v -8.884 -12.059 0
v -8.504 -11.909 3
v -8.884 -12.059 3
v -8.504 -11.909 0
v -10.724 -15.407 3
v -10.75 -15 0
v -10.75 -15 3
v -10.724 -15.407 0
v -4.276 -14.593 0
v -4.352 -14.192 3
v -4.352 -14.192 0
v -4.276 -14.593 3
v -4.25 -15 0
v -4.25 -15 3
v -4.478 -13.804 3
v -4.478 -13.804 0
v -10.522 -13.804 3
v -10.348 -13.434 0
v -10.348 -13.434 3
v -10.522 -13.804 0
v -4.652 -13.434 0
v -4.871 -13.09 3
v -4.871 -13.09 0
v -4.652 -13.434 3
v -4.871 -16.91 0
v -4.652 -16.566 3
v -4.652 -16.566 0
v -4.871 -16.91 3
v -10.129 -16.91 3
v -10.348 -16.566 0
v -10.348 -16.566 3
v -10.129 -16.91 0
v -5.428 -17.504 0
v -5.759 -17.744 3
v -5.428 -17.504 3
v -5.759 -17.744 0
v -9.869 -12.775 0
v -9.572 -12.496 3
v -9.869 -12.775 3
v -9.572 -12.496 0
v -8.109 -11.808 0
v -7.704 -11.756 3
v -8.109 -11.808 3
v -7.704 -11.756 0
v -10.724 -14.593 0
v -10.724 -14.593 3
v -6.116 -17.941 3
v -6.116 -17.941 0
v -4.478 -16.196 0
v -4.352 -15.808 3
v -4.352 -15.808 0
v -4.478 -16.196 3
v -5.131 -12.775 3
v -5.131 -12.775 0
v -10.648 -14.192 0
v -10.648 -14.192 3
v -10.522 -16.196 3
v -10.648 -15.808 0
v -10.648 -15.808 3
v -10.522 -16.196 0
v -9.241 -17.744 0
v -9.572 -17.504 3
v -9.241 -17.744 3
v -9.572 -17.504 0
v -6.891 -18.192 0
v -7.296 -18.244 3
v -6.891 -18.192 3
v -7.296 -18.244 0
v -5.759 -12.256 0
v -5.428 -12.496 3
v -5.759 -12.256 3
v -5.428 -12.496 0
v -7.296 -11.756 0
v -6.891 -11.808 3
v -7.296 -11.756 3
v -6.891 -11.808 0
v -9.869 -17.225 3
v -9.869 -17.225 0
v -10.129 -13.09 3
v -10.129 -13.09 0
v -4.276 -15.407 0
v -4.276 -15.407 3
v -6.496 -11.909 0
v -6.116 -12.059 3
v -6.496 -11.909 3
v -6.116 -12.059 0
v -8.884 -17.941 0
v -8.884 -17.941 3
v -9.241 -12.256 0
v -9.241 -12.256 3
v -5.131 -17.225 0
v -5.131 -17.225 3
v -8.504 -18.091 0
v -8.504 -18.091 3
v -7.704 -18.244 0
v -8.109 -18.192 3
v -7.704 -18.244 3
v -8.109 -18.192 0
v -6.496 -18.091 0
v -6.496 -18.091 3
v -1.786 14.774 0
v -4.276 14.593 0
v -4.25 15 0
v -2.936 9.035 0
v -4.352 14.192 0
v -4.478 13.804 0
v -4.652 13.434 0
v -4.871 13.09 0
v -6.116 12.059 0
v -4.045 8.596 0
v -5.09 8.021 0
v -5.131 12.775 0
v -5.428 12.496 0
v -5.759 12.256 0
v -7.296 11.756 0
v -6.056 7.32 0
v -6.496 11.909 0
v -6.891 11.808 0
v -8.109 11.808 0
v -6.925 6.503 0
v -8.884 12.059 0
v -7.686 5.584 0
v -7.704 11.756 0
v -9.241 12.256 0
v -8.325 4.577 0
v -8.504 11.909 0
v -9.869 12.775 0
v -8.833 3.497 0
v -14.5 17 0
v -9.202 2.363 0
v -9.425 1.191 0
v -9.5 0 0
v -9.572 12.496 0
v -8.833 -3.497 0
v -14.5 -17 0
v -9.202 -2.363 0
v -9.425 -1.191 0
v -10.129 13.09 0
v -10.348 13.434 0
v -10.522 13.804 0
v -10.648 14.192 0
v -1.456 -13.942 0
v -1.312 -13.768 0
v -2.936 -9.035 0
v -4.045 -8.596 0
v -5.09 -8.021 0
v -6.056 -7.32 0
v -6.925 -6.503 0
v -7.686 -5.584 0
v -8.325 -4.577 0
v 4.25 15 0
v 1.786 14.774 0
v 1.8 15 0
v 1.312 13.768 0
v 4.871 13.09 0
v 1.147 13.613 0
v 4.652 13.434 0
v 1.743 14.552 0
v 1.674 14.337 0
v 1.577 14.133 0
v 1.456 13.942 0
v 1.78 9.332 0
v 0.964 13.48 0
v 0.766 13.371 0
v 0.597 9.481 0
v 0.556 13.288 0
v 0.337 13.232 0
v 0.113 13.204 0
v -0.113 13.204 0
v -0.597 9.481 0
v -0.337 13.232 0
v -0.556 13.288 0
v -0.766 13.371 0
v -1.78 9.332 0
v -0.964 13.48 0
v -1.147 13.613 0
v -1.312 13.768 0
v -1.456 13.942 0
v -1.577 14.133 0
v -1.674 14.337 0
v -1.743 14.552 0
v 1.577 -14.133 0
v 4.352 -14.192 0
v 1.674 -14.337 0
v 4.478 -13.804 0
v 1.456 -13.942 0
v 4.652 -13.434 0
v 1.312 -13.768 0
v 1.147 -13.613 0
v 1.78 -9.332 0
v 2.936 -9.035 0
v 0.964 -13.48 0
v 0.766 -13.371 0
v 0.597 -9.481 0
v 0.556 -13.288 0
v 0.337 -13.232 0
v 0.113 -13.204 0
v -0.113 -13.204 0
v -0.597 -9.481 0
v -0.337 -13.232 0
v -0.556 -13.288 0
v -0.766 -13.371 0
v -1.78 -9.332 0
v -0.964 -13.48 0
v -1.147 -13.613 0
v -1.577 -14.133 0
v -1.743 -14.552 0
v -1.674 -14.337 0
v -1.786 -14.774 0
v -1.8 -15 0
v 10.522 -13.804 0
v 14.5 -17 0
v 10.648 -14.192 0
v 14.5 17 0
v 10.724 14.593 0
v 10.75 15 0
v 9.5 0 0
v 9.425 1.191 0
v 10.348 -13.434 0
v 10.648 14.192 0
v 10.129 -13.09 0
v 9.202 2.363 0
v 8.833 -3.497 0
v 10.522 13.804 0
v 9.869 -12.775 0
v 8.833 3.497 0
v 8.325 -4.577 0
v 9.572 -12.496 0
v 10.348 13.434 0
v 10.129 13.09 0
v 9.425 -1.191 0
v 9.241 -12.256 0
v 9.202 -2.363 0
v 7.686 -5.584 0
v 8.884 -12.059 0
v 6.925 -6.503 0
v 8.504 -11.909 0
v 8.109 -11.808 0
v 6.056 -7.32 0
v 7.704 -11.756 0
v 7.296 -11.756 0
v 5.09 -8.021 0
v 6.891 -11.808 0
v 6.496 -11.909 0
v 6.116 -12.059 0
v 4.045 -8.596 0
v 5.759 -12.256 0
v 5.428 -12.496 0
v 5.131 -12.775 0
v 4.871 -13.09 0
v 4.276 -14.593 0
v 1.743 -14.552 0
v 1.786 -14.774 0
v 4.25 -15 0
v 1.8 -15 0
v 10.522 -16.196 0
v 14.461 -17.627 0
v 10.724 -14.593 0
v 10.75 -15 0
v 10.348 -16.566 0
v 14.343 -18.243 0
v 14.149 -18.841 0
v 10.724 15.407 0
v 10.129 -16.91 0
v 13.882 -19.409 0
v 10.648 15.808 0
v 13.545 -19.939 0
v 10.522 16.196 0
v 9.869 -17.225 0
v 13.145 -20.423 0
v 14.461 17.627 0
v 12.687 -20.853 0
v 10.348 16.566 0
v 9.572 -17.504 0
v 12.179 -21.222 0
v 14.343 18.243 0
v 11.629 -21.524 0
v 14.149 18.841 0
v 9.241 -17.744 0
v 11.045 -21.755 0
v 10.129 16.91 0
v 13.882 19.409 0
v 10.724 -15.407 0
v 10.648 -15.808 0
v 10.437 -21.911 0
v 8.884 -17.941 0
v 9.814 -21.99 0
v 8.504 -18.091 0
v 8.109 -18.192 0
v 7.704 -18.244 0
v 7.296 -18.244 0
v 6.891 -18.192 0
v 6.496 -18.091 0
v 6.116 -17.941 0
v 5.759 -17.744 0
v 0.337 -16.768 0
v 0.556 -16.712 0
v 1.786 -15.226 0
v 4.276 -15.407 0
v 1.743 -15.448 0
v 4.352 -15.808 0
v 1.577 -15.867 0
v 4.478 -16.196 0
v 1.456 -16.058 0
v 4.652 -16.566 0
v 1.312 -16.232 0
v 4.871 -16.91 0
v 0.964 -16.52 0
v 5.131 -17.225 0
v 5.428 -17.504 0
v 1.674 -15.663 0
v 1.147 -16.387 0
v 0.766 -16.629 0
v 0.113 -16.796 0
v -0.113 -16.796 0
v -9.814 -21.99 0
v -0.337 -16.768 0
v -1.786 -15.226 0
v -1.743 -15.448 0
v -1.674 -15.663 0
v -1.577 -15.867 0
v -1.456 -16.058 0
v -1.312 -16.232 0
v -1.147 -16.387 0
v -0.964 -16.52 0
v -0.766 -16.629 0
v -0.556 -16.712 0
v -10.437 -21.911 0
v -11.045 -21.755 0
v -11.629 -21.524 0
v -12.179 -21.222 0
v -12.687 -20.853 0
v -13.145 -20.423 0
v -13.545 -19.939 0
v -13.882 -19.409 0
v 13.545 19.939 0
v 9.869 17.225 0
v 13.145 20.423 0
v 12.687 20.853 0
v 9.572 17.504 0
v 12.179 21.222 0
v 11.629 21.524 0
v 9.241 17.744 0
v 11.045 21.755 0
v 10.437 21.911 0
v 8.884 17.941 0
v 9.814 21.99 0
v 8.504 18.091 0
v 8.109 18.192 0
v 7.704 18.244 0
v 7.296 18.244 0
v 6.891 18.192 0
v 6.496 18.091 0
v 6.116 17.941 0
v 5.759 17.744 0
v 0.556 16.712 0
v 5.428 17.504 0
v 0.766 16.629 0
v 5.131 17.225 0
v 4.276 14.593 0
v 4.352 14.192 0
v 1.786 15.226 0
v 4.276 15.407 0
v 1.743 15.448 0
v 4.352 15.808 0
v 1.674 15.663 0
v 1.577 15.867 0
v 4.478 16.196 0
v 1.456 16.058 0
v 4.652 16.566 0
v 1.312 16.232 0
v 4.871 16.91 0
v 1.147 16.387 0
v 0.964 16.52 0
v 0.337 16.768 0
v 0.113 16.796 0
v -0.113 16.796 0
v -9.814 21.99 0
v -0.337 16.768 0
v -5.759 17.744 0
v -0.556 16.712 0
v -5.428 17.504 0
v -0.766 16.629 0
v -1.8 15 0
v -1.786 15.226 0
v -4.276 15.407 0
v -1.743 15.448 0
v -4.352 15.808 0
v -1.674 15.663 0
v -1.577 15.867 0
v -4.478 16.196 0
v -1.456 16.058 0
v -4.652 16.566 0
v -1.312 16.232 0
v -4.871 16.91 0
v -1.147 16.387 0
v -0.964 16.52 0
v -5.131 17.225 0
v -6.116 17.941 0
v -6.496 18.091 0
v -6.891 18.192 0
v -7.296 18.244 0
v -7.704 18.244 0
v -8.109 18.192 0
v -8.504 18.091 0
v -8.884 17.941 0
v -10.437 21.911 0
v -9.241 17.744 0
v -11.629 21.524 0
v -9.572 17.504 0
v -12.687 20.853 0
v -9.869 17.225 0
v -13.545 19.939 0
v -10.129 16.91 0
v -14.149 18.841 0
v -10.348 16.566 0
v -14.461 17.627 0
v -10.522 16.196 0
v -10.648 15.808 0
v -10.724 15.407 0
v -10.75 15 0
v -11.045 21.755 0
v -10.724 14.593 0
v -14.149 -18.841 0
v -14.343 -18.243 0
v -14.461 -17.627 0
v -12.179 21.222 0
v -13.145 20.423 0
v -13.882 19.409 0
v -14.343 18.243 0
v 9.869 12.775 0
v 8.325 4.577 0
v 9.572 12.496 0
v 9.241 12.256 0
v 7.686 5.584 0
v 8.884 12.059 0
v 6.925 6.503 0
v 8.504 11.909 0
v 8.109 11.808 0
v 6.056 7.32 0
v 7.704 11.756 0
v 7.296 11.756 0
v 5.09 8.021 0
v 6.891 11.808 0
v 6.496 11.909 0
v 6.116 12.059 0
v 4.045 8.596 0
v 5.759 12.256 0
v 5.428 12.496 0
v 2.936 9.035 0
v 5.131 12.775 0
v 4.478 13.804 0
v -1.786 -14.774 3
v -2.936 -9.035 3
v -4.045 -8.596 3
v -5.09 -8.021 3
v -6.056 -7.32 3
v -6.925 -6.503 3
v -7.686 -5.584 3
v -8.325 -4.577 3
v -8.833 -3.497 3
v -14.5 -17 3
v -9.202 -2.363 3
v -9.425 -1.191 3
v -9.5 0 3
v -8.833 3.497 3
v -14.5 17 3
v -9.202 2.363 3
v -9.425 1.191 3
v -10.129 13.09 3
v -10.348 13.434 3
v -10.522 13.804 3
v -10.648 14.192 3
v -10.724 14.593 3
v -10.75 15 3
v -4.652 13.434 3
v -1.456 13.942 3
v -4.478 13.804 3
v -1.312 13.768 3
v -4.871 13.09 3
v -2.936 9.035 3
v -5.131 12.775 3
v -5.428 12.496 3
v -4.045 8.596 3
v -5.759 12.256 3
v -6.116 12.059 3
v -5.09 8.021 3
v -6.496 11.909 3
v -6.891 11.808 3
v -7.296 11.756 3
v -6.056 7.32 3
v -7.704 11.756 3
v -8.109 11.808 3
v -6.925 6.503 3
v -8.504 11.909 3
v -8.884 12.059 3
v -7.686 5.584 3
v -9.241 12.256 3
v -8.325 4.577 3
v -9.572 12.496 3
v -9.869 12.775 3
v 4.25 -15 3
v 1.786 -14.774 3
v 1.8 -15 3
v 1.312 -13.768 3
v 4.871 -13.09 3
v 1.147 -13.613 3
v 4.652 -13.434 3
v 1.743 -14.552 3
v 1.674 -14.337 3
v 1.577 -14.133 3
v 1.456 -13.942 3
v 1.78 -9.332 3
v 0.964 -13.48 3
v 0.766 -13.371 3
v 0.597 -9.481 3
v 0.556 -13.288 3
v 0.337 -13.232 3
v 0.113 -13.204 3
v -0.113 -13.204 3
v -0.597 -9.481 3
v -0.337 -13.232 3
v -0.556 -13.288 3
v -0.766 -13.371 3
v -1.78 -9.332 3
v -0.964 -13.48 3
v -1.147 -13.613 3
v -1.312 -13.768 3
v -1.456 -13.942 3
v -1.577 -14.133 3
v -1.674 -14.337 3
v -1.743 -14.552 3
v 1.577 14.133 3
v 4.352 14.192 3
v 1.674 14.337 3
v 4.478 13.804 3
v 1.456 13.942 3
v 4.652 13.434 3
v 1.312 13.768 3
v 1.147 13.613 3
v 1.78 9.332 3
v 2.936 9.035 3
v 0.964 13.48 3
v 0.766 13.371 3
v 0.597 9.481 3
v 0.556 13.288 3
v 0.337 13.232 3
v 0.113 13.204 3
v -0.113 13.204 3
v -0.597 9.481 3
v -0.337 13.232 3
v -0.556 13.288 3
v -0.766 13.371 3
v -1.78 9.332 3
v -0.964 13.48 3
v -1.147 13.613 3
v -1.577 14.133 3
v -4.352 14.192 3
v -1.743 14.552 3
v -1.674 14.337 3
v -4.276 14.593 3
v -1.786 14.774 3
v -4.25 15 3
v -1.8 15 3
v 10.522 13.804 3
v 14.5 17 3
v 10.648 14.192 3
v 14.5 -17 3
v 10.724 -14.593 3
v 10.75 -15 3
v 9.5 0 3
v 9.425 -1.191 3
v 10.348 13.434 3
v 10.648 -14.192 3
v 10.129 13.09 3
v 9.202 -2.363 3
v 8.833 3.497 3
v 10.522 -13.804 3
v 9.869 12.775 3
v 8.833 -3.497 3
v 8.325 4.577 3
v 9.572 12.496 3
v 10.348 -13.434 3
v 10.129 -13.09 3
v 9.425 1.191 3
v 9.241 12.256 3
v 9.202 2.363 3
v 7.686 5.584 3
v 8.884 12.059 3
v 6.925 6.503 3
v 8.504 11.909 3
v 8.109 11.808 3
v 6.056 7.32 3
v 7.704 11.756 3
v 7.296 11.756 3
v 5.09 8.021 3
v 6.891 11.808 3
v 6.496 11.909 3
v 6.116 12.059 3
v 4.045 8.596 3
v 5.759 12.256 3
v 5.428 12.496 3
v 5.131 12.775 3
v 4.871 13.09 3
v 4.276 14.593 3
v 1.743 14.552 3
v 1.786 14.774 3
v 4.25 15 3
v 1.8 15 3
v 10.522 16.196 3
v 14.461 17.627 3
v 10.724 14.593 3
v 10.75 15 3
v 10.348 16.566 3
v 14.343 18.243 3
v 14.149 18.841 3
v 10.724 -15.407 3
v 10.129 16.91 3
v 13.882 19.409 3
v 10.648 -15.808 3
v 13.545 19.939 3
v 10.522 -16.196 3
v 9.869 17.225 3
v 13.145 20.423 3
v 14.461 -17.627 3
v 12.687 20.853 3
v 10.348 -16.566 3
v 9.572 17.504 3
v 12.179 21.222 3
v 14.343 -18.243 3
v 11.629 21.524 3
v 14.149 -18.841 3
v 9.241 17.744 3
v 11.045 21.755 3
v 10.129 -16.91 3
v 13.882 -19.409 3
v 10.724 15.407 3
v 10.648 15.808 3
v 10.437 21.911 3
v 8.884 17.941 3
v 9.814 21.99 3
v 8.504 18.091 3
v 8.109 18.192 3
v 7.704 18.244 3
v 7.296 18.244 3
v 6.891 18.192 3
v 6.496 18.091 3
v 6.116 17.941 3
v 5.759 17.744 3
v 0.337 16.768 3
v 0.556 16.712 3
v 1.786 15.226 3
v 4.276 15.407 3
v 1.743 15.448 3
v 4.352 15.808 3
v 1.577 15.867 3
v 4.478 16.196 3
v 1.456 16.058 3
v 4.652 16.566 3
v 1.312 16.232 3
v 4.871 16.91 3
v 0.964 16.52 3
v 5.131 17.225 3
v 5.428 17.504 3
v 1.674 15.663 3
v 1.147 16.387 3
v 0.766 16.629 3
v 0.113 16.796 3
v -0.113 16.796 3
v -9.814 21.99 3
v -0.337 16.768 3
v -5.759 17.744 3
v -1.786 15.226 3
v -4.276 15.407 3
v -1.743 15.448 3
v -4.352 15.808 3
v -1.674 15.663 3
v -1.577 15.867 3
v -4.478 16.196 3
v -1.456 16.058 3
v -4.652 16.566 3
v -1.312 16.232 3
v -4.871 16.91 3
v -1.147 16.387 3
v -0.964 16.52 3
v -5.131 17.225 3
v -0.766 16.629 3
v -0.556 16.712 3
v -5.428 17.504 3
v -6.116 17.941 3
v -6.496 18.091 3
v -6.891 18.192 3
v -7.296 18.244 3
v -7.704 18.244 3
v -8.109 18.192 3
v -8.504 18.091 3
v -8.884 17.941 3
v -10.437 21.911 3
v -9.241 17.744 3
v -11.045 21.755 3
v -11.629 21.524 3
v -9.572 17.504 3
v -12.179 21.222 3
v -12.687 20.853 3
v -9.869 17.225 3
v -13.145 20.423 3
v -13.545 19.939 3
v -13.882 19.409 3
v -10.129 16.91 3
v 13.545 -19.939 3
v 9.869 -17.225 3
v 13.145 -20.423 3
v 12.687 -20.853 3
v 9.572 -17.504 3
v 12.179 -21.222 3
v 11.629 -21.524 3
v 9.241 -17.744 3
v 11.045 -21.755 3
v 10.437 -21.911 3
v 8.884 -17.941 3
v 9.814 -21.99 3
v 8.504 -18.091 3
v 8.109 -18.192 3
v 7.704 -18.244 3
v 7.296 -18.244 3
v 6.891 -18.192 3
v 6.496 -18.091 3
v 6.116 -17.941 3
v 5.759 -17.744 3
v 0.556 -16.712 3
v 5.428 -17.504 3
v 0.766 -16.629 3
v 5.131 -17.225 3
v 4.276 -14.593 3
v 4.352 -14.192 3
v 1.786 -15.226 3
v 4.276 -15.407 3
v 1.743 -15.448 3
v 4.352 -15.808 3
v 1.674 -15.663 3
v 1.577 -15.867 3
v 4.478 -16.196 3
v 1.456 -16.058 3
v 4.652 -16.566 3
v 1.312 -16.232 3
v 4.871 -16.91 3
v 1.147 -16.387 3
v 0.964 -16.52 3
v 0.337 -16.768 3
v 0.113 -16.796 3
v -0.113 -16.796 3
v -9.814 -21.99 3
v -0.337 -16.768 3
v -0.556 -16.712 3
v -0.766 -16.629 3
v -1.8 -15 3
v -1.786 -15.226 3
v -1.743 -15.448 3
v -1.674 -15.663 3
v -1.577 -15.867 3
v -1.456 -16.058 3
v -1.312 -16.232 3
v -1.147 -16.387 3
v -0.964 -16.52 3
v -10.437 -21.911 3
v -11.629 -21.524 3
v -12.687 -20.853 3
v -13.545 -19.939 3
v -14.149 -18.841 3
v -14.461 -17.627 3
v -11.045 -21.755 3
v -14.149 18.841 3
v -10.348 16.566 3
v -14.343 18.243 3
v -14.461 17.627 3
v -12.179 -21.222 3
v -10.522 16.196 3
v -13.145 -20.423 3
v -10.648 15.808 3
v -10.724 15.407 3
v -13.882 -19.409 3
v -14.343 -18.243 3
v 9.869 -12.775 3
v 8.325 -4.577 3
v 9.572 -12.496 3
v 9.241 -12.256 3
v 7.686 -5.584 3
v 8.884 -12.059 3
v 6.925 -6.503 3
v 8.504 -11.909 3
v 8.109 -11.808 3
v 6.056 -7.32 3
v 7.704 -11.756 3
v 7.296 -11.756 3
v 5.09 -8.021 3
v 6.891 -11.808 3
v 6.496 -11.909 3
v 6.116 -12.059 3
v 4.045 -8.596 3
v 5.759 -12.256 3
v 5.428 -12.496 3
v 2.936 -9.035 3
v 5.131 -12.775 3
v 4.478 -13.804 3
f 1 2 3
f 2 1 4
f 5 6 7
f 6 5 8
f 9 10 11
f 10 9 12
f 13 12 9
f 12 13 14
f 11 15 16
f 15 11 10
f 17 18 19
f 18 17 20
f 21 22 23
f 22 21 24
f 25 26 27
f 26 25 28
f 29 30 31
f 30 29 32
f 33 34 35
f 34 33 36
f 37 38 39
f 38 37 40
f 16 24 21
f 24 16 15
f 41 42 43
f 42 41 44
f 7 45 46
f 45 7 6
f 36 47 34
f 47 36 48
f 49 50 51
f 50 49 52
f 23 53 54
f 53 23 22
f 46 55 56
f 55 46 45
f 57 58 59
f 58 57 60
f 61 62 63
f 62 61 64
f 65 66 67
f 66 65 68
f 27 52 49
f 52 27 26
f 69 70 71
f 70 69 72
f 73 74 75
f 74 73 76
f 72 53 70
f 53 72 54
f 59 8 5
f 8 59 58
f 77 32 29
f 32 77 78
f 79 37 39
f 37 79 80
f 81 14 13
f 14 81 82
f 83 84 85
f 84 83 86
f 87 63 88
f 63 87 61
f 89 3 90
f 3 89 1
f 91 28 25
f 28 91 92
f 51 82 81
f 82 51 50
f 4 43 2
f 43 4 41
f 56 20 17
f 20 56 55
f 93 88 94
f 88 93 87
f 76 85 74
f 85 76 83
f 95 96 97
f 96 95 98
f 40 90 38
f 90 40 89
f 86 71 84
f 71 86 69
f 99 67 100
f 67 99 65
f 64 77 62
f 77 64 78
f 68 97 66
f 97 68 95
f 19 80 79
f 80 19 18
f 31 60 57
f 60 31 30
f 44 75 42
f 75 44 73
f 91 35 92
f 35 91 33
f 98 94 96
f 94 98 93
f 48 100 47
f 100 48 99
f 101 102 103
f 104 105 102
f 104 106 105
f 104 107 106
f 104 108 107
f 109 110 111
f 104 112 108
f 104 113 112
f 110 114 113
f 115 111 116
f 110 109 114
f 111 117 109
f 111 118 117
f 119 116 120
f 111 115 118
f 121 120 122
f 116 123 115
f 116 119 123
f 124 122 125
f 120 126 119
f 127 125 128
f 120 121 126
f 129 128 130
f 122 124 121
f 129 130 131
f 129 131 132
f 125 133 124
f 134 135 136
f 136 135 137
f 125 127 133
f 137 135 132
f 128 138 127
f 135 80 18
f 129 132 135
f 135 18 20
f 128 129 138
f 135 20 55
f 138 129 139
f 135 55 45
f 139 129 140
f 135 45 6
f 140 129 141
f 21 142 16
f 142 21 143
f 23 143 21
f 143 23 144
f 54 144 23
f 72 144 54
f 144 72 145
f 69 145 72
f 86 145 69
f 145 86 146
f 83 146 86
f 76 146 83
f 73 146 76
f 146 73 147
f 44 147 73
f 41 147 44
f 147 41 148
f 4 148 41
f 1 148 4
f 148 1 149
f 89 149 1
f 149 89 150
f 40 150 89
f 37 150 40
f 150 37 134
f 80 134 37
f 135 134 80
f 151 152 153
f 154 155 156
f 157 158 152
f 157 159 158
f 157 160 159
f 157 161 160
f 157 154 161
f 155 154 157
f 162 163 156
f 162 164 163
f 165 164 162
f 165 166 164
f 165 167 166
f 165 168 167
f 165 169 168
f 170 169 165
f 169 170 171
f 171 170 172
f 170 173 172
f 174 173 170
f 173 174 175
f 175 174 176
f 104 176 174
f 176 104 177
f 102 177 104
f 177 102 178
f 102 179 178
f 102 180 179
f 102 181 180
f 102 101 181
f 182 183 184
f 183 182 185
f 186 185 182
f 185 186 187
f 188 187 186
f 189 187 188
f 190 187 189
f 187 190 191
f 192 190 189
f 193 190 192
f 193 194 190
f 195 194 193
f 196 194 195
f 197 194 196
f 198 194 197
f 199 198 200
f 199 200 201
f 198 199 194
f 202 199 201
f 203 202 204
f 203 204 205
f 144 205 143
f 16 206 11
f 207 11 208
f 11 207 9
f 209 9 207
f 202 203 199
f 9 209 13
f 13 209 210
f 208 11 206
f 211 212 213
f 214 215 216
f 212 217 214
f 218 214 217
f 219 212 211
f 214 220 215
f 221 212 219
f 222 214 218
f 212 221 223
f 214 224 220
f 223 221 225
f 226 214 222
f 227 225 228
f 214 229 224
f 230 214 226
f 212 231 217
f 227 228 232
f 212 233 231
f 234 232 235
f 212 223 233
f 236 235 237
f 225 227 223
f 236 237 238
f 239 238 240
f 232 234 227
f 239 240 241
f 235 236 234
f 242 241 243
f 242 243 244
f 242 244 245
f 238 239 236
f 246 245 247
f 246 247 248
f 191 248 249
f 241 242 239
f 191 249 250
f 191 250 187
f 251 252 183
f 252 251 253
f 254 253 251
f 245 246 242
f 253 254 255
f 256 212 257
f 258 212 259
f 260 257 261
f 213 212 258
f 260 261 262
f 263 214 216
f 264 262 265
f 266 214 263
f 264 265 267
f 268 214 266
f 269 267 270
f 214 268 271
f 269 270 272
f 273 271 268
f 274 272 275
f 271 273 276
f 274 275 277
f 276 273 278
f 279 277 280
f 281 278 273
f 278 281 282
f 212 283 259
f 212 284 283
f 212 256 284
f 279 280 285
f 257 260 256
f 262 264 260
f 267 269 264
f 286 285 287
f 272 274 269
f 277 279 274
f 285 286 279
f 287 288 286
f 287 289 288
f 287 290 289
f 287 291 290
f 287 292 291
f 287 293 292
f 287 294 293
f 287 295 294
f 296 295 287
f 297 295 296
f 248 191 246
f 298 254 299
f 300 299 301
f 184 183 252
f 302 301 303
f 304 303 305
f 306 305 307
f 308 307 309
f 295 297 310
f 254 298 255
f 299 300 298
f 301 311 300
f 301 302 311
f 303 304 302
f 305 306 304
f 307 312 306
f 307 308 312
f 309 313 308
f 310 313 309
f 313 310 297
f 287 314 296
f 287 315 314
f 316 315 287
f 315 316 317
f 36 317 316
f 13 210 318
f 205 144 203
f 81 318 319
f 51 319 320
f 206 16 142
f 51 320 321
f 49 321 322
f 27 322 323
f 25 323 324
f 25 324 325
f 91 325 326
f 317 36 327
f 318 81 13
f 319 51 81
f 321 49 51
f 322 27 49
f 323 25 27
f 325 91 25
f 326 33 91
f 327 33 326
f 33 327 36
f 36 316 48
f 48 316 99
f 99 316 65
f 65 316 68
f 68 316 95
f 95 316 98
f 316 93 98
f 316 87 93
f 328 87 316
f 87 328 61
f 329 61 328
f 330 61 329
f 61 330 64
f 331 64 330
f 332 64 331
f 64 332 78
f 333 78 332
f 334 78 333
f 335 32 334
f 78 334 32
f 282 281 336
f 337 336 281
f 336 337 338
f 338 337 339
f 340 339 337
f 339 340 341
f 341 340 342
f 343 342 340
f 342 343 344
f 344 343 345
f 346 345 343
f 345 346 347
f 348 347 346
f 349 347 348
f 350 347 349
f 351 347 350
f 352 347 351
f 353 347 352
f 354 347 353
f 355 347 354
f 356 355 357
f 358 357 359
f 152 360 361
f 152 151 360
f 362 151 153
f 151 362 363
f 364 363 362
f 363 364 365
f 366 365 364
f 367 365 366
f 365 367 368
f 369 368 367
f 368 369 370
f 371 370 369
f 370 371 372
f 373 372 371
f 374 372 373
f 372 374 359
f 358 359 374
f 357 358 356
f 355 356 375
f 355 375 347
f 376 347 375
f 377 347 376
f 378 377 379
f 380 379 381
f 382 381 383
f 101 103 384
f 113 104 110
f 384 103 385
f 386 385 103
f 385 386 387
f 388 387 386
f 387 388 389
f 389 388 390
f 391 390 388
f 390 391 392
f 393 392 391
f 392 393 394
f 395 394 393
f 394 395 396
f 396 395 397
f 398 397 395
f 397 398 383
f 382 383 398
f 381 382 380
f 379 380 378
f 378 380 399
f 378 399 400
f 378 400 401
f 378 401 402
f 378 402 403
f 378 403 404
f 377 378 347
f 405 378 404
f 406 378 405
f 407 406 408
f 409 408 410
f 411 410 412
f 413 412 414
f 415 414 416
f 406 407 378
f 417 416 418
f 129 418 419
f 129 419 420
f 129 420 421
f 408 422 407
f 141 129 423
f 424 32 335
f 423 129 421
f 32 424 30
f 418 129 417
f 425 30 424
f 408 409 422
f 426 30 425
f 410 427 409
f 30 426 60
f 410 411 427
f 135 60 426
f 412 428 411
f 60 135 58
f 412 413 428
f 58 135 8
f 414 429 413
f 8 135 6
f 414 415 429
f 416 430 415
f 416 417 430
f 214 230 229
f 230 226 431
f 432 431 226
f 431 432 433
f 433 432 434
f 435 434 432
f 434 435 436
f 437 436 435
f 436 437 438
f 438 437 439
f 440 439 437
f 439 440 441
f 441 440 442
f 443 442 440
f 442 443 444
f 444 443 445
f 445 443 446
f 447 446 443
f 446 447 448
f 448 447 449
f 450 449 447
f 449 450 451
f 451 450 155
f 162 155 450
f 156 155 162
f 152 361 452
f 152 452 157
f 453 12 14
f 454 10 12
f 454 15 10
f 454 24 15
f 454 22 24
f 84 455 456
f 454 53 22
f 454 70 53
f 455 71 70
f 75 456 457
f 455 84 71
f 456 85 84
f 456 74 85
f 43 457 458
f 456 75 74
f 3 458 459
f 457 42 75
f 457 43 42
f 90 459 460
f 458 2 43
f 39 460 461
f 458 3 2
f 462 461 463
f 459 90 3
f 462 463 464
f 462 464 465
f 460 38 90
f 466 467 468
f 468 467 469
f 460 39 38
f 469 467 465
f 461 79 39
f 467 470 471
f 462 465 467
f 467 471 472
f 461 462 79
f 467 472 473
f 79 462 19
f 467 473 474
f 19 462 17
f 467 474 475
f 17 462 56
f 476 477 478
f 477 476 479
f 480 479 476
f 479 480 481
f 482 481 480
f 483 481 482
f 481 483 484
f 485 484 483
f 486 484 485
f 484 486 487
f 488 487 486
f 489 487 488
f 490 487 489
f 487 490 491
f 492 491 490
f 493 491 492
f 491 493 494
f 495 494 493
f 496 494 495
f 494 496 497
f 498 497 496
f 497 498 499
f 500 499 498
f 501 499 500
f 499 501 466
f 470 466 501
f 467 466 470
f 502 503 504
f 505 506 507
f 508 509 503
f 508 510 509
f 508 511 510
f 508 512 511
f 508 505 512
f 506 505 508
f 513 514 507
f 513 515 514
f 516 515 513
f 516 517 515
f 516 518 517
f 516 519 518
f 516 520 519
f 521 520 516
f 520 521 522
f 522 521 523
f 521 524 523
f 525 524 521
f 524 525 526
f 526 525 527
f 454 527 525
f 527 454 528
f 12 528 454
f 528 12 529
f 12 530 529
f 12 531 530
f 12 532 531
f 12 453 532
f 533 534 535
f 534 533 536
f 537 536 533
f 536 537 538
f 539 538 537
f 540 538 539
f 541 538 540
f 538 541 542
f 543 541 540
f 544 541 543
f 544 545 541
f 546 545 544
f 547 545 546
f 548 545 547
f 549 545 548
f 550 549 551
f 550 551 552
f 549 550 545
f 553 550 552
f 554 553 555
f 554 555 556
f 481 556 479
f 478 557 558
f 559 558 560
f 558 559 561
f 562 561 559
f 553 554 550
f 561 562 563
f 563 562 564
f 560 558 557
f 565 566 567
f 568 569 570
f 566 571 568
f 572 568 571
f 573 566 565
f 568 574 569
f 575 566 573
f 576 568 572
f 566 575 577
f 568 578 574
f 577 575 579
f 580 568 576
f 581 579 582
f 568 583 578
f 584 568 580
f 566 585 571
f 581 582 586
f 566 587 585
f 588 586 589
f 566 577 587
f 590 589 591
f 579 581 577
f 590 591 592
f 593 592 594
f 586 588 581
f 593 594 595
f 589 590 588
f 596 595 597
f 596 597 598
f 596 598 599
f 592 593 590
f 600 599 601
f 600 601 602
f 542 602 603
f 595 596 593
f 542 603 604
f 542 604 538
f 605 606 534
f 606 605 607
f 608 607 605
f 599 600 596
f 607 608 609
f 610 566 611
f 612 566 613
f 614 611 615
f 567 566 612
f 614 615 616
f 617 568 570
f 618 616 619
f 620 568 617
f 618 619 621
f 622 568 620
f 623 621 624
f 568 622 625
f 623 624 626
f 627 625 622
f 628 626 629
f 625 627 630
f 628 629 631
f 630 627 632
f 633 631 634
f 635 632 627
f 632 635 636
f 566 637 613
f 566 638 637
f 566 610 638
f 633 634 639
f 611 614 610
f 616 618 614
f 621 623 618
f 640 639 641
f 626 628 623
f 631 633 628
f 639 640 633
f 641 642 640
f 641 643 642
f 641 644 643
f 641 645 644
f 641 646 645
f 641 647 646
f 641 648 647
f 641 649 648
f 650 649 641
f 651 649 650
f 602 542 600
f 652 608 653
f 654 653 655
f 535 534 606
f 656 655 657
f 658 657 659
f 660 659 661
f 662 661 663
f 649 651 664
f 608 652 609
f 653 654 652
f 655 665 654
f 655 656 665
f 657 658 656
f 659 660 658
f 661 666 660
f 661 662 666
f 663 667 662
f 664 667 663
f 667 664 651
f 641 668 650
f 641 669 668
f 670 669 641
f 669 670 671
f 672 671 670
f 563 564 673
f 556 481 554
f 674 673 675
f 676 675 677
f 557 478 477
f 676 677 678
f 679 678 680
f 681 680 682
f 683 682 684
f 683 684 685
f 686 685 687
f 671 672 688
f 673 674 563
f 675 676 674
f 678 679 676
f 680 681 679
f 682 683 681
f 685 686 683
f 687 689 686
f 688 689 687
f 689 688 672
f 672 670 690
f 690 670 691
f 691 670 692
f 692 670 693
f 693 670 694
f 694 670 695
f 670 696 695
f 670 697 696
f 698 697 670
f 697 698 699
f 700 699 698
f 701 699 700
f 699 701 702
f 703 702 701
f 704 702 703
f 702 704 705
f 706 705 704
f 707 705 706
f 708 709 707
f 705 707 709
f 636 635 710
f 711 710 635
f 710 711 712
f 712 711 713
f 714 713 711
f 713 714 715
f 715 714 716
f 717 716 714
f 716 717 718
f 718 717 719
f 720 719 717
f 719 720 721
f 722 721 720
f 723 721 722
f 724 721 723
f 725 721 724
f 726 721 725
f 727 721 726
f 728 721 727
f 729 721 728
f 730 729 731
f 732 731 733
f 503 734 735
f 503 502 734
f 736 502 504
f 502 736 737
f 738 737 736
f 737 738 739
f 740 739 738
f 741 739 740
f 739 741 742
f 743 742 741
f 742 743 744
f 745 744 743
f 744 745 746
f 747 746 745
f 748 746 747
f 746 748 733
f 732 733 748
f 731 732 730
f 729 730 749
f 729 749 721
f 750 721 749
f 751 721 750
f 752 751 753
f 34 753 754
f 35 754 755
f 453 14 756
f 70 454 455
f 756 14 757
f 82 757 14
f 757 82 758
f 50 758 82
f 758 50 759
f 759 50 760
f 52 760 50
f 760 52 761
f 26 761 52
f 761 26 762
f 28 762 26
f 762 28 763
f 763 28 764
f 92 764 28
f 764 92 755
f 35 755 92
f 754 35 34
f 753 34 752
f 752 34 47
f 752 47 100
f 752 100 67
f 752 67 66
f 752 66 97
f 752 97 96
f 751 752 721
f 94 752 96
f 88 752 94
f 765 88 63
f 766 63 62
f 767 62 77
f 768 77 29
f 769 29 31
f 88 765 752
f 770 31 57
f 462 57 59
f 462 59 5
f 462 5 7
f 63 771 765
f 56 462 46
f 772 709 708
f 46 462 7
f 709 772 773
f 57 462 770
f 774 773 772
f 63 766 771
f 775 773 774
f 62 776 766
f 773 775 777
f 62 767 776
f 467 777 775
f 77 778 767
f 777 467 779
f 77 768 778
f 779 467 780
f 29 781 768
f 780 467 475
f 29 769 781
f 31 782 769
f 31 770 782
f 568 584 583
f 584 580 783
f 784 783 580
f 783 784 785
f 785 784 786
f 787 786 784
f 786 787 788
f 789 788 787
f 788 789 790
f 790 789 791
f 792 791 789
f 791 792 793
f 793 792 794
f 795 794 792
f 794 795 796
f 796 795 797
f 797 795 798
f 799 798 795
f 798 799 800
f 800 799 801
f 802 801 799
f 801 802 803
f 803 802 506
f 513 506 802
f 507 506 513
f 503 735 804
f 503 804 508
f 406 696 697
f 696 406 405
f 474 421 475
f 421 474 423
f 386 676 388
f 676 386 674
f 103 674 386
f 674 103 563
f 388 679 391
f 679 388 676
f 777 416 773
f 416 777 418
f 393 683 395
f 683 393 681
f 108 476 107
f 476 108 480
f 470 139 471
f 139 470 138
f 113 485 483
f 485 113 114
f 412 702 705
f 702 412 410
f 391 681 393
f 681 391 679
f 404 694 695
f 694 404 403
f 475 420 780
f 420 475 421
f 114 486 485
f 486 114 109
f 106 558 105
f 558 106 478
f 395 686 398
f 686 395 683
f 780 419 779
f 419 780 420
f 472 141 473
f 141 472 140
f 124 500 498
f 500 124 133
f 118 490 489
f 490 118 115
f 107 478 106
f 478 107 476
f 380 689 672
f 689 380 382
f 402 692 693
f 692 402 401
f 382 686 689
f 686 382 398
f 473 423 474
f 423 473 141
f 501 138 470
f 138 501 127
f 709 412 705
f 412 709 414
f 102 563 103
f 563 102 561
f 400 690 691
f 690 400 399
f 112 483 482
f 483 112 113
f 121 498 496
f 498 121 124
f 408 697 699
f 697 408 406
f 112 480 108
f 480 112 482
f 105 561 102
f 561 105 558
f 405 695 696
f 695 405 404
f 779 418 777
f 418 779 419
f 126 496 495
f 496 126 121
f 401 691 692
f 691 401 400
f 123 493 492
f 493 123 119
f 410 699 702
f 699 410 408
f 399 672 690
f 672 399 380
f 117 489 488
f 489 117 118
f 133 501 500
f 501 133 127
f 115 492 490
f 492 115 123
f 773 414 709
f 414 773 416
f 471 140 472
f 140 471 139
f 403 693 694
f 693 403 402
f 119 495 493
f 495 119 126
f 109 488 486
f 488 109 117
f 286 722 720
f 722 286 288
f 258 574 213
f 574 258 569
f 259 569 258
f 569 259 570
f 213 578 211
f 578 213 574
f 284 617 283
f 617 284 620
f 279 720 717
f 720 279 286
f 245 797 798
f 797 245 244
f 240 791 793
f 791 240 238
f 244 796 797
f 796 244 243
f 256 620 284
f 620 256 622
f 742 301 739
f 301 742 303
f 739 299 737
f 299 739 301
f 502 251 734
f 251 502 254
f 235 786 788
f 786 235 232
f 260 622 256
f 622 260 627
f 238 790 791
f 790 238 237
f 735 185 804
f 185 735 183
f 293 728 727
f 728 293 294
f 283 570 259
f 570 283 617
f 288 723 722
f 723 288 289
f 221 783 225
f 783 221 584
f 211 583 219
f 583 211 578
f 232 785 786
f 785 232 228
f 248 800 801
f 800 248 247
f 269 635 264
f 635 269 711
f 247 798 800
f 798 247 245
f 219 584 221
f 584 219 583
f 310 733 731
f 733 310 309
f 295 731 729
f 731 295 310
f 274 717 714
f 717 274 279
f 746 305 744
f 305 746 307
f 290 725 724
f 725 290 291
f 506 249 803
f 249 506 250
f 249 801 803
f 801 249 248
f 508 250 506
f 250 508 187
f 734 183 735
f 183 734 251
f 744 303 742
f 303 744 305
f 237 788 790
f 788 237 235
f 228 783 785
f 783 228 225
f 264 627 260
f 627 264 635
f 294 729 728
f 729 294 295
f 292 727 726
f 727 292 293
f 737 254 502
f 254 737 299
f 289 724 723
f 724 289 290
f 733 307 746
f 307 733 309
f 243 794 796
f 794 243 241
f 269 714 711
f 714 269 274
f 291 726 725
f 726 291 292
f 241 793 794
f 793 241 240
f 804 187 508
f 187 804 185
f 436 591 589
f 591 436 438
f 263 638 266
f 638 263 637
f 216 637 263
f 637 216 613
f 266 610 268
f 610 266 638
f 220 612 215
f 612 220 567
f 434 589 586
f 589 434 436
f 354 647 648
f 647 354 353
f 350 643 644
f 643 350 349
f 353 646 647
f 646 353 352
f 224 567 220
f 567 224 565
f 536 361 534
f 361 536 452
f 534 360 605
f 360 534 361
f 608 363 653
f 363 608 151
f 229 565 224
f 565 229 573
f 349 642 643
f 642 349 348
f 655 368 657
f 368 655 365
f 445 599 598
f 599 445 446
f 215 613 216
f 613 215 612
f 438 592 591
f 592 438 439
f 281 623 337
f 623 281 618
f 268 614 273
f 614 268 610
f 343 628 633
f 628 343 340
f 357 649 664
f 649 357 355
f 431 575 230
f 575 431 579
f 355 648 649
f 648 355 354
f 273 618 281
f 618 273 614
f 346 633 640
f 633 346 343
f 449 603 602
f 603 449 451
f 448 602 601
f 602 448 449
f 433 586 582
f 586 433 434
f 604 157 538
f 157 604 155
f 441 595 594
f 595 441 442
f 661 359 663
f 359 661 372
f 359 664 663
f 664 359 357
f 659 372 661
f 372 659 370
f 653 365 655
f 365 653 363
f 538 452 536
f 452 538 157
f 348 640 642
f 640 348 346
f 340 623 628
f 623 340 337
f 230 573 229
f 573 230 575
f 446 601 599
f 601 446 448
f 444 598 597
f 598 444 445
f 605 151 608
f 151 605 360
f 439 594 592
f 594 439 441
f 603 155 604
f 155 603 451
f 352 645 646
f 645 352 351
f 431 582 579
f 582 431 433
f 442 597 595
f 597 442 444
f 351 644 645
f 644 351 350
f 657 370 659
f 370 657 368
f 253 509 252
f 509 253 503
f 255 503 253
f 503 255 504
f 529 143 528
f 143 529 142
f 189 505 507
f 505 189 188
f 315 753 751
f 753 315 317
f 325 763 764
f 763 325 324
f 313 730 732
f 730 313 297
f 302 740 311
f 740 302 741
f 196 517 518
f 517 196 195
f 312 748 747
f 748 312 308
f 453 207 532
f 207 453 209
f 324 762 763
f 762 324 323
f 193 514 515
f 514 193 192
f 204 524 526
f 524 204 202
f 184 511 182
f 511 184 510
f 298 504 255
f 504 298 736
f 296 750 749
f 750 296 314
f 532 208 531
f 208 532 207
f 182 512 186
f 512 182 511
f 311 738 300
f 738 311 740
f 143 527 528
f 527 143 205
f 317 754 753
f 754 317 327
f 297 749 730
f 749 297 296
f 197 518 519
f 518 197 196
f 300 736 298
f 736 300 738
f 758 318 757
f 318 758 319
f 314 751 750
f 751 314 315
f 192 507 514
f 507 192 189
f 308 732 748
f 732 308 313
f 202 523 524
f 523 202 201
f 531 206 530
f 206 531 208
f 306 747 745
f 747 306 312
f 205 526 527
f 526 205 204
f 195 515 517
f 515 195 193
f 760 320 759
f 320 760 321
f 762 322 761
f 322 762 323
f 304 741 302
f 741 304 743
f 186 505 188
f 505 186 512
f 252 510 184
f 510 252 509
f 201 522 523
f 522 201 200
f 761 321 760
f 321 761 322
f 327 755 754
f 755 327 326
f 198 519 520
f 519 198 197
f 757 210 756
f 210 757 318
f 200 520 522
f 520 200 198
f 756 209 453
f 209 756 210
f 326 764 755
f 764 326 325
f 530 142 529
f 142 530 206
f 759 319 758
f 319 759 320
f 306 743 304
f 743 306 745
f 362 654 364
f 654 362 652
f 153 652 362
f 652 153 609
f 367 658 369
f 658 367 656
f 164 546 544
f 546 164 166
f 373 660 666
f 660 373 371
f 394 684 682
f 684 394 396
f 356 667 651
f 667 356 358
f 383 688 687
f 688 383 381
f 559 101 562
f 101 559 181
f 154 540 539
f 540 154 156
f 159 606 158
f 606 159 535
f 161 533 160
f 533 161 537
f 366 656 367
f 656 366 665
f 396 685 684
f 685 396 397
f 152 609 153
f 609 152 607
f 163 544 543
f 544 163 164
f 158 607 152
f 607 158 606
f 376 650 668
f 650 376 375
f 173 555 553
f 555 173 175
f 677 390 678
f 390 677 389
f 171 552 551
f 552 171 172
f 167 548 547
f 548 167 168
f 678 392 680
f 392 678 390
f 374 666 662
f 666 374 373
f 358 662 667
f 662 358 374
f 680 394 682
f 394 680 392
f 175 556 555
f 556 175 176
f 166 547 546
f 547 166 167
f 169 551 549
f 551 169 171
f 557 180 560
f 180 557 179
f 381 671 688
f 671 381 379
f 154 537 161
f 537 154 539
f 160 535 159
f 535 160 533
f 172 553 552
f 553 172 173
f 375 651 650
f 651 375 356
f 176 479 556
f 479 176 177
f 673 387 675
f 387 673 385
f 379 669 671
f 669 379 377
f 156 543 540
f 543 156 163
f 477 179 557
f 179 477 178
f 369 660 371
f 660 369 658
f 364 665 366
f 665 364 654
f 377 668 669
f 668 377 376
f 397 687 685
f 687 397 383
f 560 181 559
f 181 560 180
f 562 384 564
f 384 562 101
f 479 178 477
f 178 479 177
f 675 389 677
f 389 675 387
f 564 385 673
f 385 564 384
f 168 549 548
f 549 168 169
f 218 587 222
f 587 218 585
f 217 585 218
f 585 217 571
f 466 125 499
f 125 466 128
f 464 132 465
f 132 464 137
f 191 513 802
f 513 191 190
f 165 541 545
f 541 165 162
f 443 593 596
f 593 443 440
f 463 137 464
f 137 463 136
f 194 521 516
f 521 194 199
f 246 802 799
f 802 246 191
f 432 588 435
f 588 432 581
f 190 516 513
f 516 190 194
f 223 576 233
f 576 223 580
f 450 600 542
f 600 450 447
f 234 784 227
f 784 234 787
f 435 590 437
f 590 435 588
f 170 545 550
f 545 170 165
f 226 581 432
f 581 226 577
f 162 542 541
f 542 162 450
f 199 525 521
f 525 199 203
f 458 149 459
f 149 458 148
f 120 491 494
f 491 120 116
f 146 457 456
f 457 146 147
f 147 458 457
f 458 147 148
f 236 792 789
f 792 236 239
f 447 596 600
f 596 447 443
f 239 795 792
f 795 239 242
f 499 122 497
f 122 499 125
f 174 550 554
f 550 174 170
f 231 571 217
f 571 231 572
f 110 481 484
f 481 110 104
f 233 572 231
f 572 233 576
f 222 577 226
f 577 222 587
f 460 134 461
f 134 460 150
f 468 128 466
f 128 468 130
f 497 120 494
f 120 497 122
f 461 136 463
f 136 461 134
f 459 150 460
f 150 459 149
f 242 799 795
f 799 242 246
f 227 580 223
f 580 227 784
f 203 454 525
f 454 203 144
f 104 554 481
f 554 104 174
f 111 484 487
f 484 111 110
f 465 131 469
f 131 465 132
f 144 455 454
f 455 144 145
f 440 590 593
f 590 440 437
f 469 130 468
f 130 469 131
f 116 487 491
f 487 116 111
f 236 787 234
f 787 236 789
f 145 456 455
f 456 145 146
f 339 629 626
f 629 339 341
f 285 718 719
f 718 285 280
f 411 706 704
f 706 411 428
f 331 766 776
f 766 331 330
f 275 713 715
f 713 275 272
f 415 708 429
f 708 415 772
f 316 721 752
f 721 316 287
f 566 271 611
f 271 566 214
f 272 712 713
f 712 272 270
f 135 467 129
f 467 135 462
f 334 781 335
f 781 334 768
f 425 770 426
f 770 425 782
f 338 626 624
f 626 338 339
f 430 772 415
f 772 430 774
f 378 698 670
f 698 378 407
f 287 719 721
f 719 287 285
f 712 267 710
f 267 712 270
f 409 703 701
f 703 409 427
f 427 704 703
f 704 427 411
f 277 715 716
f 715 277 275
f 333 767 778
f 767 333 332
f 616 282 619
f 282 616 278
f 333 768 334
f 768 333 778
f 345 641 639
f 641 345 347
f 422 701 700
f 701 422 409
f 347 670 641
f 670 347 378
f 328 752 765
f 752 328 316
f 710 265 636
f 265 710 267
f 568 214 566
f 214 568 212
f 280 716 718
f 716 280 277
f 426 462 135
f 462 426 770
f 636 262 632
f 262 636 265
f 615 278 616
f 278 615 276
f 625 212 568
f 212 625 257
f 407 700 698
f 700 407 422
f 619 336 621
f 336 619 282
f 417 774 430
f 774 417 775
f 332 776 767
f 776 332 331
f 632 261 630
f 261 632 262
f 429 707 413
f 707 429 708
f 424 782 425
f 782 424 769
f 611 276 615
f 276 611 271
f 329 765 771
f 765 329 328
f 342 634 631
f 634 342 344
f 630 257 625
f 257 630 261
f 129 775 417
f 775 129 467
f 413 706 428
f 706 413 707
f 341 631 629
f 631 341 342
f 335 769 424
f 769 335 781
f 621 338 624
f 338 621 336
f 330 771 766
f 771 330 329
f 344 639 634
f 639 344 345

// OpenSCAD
$fn = 50;

difference() {
	union() {
		hull() {
			translate(v = [-9.5, 17.0, 0]) {
				cylinder(h = 3, r = 5);
			}
			translate(v = [9.5, 17.0, 0]) {
				cylinder(h = 3, r = 5);
			}
			translate(v = [-9.5, -17.0, 0]) {
				cylinder(h = 3, r = 5);
			}
			translate(v = [9.5, -17.0, 0]) {
				cylinder(h = 3, r = 5);
			}
		}
	}
	union() {
		translate(v = [-7.5, -15.0, 0]) {
			cylinder(h = 3, r = 3.25);
		}
		translate(v = [-7.5, 15.0, 0]) {
			cylinder(h = 3, r = 3.25);
		}
		translate(v = [7.5, -15.0, 0]) {
			cylinder(h = 3, r = 3.25);
		}
		translate(v = [7.5, 15.0, 0]) {
			cylinder(h = 3, r = 3.25);
		}
		translate(v = [0.0, -15.0, 0]) {
			cylinder(h = 3, r = 1.8);
		}
		translate(v = [0.0, 15.0, 0]) {
			cylinder(h = 3, r = 1.8);
		}
		cylinder(h = 3, r = 9.5);
	}
}
